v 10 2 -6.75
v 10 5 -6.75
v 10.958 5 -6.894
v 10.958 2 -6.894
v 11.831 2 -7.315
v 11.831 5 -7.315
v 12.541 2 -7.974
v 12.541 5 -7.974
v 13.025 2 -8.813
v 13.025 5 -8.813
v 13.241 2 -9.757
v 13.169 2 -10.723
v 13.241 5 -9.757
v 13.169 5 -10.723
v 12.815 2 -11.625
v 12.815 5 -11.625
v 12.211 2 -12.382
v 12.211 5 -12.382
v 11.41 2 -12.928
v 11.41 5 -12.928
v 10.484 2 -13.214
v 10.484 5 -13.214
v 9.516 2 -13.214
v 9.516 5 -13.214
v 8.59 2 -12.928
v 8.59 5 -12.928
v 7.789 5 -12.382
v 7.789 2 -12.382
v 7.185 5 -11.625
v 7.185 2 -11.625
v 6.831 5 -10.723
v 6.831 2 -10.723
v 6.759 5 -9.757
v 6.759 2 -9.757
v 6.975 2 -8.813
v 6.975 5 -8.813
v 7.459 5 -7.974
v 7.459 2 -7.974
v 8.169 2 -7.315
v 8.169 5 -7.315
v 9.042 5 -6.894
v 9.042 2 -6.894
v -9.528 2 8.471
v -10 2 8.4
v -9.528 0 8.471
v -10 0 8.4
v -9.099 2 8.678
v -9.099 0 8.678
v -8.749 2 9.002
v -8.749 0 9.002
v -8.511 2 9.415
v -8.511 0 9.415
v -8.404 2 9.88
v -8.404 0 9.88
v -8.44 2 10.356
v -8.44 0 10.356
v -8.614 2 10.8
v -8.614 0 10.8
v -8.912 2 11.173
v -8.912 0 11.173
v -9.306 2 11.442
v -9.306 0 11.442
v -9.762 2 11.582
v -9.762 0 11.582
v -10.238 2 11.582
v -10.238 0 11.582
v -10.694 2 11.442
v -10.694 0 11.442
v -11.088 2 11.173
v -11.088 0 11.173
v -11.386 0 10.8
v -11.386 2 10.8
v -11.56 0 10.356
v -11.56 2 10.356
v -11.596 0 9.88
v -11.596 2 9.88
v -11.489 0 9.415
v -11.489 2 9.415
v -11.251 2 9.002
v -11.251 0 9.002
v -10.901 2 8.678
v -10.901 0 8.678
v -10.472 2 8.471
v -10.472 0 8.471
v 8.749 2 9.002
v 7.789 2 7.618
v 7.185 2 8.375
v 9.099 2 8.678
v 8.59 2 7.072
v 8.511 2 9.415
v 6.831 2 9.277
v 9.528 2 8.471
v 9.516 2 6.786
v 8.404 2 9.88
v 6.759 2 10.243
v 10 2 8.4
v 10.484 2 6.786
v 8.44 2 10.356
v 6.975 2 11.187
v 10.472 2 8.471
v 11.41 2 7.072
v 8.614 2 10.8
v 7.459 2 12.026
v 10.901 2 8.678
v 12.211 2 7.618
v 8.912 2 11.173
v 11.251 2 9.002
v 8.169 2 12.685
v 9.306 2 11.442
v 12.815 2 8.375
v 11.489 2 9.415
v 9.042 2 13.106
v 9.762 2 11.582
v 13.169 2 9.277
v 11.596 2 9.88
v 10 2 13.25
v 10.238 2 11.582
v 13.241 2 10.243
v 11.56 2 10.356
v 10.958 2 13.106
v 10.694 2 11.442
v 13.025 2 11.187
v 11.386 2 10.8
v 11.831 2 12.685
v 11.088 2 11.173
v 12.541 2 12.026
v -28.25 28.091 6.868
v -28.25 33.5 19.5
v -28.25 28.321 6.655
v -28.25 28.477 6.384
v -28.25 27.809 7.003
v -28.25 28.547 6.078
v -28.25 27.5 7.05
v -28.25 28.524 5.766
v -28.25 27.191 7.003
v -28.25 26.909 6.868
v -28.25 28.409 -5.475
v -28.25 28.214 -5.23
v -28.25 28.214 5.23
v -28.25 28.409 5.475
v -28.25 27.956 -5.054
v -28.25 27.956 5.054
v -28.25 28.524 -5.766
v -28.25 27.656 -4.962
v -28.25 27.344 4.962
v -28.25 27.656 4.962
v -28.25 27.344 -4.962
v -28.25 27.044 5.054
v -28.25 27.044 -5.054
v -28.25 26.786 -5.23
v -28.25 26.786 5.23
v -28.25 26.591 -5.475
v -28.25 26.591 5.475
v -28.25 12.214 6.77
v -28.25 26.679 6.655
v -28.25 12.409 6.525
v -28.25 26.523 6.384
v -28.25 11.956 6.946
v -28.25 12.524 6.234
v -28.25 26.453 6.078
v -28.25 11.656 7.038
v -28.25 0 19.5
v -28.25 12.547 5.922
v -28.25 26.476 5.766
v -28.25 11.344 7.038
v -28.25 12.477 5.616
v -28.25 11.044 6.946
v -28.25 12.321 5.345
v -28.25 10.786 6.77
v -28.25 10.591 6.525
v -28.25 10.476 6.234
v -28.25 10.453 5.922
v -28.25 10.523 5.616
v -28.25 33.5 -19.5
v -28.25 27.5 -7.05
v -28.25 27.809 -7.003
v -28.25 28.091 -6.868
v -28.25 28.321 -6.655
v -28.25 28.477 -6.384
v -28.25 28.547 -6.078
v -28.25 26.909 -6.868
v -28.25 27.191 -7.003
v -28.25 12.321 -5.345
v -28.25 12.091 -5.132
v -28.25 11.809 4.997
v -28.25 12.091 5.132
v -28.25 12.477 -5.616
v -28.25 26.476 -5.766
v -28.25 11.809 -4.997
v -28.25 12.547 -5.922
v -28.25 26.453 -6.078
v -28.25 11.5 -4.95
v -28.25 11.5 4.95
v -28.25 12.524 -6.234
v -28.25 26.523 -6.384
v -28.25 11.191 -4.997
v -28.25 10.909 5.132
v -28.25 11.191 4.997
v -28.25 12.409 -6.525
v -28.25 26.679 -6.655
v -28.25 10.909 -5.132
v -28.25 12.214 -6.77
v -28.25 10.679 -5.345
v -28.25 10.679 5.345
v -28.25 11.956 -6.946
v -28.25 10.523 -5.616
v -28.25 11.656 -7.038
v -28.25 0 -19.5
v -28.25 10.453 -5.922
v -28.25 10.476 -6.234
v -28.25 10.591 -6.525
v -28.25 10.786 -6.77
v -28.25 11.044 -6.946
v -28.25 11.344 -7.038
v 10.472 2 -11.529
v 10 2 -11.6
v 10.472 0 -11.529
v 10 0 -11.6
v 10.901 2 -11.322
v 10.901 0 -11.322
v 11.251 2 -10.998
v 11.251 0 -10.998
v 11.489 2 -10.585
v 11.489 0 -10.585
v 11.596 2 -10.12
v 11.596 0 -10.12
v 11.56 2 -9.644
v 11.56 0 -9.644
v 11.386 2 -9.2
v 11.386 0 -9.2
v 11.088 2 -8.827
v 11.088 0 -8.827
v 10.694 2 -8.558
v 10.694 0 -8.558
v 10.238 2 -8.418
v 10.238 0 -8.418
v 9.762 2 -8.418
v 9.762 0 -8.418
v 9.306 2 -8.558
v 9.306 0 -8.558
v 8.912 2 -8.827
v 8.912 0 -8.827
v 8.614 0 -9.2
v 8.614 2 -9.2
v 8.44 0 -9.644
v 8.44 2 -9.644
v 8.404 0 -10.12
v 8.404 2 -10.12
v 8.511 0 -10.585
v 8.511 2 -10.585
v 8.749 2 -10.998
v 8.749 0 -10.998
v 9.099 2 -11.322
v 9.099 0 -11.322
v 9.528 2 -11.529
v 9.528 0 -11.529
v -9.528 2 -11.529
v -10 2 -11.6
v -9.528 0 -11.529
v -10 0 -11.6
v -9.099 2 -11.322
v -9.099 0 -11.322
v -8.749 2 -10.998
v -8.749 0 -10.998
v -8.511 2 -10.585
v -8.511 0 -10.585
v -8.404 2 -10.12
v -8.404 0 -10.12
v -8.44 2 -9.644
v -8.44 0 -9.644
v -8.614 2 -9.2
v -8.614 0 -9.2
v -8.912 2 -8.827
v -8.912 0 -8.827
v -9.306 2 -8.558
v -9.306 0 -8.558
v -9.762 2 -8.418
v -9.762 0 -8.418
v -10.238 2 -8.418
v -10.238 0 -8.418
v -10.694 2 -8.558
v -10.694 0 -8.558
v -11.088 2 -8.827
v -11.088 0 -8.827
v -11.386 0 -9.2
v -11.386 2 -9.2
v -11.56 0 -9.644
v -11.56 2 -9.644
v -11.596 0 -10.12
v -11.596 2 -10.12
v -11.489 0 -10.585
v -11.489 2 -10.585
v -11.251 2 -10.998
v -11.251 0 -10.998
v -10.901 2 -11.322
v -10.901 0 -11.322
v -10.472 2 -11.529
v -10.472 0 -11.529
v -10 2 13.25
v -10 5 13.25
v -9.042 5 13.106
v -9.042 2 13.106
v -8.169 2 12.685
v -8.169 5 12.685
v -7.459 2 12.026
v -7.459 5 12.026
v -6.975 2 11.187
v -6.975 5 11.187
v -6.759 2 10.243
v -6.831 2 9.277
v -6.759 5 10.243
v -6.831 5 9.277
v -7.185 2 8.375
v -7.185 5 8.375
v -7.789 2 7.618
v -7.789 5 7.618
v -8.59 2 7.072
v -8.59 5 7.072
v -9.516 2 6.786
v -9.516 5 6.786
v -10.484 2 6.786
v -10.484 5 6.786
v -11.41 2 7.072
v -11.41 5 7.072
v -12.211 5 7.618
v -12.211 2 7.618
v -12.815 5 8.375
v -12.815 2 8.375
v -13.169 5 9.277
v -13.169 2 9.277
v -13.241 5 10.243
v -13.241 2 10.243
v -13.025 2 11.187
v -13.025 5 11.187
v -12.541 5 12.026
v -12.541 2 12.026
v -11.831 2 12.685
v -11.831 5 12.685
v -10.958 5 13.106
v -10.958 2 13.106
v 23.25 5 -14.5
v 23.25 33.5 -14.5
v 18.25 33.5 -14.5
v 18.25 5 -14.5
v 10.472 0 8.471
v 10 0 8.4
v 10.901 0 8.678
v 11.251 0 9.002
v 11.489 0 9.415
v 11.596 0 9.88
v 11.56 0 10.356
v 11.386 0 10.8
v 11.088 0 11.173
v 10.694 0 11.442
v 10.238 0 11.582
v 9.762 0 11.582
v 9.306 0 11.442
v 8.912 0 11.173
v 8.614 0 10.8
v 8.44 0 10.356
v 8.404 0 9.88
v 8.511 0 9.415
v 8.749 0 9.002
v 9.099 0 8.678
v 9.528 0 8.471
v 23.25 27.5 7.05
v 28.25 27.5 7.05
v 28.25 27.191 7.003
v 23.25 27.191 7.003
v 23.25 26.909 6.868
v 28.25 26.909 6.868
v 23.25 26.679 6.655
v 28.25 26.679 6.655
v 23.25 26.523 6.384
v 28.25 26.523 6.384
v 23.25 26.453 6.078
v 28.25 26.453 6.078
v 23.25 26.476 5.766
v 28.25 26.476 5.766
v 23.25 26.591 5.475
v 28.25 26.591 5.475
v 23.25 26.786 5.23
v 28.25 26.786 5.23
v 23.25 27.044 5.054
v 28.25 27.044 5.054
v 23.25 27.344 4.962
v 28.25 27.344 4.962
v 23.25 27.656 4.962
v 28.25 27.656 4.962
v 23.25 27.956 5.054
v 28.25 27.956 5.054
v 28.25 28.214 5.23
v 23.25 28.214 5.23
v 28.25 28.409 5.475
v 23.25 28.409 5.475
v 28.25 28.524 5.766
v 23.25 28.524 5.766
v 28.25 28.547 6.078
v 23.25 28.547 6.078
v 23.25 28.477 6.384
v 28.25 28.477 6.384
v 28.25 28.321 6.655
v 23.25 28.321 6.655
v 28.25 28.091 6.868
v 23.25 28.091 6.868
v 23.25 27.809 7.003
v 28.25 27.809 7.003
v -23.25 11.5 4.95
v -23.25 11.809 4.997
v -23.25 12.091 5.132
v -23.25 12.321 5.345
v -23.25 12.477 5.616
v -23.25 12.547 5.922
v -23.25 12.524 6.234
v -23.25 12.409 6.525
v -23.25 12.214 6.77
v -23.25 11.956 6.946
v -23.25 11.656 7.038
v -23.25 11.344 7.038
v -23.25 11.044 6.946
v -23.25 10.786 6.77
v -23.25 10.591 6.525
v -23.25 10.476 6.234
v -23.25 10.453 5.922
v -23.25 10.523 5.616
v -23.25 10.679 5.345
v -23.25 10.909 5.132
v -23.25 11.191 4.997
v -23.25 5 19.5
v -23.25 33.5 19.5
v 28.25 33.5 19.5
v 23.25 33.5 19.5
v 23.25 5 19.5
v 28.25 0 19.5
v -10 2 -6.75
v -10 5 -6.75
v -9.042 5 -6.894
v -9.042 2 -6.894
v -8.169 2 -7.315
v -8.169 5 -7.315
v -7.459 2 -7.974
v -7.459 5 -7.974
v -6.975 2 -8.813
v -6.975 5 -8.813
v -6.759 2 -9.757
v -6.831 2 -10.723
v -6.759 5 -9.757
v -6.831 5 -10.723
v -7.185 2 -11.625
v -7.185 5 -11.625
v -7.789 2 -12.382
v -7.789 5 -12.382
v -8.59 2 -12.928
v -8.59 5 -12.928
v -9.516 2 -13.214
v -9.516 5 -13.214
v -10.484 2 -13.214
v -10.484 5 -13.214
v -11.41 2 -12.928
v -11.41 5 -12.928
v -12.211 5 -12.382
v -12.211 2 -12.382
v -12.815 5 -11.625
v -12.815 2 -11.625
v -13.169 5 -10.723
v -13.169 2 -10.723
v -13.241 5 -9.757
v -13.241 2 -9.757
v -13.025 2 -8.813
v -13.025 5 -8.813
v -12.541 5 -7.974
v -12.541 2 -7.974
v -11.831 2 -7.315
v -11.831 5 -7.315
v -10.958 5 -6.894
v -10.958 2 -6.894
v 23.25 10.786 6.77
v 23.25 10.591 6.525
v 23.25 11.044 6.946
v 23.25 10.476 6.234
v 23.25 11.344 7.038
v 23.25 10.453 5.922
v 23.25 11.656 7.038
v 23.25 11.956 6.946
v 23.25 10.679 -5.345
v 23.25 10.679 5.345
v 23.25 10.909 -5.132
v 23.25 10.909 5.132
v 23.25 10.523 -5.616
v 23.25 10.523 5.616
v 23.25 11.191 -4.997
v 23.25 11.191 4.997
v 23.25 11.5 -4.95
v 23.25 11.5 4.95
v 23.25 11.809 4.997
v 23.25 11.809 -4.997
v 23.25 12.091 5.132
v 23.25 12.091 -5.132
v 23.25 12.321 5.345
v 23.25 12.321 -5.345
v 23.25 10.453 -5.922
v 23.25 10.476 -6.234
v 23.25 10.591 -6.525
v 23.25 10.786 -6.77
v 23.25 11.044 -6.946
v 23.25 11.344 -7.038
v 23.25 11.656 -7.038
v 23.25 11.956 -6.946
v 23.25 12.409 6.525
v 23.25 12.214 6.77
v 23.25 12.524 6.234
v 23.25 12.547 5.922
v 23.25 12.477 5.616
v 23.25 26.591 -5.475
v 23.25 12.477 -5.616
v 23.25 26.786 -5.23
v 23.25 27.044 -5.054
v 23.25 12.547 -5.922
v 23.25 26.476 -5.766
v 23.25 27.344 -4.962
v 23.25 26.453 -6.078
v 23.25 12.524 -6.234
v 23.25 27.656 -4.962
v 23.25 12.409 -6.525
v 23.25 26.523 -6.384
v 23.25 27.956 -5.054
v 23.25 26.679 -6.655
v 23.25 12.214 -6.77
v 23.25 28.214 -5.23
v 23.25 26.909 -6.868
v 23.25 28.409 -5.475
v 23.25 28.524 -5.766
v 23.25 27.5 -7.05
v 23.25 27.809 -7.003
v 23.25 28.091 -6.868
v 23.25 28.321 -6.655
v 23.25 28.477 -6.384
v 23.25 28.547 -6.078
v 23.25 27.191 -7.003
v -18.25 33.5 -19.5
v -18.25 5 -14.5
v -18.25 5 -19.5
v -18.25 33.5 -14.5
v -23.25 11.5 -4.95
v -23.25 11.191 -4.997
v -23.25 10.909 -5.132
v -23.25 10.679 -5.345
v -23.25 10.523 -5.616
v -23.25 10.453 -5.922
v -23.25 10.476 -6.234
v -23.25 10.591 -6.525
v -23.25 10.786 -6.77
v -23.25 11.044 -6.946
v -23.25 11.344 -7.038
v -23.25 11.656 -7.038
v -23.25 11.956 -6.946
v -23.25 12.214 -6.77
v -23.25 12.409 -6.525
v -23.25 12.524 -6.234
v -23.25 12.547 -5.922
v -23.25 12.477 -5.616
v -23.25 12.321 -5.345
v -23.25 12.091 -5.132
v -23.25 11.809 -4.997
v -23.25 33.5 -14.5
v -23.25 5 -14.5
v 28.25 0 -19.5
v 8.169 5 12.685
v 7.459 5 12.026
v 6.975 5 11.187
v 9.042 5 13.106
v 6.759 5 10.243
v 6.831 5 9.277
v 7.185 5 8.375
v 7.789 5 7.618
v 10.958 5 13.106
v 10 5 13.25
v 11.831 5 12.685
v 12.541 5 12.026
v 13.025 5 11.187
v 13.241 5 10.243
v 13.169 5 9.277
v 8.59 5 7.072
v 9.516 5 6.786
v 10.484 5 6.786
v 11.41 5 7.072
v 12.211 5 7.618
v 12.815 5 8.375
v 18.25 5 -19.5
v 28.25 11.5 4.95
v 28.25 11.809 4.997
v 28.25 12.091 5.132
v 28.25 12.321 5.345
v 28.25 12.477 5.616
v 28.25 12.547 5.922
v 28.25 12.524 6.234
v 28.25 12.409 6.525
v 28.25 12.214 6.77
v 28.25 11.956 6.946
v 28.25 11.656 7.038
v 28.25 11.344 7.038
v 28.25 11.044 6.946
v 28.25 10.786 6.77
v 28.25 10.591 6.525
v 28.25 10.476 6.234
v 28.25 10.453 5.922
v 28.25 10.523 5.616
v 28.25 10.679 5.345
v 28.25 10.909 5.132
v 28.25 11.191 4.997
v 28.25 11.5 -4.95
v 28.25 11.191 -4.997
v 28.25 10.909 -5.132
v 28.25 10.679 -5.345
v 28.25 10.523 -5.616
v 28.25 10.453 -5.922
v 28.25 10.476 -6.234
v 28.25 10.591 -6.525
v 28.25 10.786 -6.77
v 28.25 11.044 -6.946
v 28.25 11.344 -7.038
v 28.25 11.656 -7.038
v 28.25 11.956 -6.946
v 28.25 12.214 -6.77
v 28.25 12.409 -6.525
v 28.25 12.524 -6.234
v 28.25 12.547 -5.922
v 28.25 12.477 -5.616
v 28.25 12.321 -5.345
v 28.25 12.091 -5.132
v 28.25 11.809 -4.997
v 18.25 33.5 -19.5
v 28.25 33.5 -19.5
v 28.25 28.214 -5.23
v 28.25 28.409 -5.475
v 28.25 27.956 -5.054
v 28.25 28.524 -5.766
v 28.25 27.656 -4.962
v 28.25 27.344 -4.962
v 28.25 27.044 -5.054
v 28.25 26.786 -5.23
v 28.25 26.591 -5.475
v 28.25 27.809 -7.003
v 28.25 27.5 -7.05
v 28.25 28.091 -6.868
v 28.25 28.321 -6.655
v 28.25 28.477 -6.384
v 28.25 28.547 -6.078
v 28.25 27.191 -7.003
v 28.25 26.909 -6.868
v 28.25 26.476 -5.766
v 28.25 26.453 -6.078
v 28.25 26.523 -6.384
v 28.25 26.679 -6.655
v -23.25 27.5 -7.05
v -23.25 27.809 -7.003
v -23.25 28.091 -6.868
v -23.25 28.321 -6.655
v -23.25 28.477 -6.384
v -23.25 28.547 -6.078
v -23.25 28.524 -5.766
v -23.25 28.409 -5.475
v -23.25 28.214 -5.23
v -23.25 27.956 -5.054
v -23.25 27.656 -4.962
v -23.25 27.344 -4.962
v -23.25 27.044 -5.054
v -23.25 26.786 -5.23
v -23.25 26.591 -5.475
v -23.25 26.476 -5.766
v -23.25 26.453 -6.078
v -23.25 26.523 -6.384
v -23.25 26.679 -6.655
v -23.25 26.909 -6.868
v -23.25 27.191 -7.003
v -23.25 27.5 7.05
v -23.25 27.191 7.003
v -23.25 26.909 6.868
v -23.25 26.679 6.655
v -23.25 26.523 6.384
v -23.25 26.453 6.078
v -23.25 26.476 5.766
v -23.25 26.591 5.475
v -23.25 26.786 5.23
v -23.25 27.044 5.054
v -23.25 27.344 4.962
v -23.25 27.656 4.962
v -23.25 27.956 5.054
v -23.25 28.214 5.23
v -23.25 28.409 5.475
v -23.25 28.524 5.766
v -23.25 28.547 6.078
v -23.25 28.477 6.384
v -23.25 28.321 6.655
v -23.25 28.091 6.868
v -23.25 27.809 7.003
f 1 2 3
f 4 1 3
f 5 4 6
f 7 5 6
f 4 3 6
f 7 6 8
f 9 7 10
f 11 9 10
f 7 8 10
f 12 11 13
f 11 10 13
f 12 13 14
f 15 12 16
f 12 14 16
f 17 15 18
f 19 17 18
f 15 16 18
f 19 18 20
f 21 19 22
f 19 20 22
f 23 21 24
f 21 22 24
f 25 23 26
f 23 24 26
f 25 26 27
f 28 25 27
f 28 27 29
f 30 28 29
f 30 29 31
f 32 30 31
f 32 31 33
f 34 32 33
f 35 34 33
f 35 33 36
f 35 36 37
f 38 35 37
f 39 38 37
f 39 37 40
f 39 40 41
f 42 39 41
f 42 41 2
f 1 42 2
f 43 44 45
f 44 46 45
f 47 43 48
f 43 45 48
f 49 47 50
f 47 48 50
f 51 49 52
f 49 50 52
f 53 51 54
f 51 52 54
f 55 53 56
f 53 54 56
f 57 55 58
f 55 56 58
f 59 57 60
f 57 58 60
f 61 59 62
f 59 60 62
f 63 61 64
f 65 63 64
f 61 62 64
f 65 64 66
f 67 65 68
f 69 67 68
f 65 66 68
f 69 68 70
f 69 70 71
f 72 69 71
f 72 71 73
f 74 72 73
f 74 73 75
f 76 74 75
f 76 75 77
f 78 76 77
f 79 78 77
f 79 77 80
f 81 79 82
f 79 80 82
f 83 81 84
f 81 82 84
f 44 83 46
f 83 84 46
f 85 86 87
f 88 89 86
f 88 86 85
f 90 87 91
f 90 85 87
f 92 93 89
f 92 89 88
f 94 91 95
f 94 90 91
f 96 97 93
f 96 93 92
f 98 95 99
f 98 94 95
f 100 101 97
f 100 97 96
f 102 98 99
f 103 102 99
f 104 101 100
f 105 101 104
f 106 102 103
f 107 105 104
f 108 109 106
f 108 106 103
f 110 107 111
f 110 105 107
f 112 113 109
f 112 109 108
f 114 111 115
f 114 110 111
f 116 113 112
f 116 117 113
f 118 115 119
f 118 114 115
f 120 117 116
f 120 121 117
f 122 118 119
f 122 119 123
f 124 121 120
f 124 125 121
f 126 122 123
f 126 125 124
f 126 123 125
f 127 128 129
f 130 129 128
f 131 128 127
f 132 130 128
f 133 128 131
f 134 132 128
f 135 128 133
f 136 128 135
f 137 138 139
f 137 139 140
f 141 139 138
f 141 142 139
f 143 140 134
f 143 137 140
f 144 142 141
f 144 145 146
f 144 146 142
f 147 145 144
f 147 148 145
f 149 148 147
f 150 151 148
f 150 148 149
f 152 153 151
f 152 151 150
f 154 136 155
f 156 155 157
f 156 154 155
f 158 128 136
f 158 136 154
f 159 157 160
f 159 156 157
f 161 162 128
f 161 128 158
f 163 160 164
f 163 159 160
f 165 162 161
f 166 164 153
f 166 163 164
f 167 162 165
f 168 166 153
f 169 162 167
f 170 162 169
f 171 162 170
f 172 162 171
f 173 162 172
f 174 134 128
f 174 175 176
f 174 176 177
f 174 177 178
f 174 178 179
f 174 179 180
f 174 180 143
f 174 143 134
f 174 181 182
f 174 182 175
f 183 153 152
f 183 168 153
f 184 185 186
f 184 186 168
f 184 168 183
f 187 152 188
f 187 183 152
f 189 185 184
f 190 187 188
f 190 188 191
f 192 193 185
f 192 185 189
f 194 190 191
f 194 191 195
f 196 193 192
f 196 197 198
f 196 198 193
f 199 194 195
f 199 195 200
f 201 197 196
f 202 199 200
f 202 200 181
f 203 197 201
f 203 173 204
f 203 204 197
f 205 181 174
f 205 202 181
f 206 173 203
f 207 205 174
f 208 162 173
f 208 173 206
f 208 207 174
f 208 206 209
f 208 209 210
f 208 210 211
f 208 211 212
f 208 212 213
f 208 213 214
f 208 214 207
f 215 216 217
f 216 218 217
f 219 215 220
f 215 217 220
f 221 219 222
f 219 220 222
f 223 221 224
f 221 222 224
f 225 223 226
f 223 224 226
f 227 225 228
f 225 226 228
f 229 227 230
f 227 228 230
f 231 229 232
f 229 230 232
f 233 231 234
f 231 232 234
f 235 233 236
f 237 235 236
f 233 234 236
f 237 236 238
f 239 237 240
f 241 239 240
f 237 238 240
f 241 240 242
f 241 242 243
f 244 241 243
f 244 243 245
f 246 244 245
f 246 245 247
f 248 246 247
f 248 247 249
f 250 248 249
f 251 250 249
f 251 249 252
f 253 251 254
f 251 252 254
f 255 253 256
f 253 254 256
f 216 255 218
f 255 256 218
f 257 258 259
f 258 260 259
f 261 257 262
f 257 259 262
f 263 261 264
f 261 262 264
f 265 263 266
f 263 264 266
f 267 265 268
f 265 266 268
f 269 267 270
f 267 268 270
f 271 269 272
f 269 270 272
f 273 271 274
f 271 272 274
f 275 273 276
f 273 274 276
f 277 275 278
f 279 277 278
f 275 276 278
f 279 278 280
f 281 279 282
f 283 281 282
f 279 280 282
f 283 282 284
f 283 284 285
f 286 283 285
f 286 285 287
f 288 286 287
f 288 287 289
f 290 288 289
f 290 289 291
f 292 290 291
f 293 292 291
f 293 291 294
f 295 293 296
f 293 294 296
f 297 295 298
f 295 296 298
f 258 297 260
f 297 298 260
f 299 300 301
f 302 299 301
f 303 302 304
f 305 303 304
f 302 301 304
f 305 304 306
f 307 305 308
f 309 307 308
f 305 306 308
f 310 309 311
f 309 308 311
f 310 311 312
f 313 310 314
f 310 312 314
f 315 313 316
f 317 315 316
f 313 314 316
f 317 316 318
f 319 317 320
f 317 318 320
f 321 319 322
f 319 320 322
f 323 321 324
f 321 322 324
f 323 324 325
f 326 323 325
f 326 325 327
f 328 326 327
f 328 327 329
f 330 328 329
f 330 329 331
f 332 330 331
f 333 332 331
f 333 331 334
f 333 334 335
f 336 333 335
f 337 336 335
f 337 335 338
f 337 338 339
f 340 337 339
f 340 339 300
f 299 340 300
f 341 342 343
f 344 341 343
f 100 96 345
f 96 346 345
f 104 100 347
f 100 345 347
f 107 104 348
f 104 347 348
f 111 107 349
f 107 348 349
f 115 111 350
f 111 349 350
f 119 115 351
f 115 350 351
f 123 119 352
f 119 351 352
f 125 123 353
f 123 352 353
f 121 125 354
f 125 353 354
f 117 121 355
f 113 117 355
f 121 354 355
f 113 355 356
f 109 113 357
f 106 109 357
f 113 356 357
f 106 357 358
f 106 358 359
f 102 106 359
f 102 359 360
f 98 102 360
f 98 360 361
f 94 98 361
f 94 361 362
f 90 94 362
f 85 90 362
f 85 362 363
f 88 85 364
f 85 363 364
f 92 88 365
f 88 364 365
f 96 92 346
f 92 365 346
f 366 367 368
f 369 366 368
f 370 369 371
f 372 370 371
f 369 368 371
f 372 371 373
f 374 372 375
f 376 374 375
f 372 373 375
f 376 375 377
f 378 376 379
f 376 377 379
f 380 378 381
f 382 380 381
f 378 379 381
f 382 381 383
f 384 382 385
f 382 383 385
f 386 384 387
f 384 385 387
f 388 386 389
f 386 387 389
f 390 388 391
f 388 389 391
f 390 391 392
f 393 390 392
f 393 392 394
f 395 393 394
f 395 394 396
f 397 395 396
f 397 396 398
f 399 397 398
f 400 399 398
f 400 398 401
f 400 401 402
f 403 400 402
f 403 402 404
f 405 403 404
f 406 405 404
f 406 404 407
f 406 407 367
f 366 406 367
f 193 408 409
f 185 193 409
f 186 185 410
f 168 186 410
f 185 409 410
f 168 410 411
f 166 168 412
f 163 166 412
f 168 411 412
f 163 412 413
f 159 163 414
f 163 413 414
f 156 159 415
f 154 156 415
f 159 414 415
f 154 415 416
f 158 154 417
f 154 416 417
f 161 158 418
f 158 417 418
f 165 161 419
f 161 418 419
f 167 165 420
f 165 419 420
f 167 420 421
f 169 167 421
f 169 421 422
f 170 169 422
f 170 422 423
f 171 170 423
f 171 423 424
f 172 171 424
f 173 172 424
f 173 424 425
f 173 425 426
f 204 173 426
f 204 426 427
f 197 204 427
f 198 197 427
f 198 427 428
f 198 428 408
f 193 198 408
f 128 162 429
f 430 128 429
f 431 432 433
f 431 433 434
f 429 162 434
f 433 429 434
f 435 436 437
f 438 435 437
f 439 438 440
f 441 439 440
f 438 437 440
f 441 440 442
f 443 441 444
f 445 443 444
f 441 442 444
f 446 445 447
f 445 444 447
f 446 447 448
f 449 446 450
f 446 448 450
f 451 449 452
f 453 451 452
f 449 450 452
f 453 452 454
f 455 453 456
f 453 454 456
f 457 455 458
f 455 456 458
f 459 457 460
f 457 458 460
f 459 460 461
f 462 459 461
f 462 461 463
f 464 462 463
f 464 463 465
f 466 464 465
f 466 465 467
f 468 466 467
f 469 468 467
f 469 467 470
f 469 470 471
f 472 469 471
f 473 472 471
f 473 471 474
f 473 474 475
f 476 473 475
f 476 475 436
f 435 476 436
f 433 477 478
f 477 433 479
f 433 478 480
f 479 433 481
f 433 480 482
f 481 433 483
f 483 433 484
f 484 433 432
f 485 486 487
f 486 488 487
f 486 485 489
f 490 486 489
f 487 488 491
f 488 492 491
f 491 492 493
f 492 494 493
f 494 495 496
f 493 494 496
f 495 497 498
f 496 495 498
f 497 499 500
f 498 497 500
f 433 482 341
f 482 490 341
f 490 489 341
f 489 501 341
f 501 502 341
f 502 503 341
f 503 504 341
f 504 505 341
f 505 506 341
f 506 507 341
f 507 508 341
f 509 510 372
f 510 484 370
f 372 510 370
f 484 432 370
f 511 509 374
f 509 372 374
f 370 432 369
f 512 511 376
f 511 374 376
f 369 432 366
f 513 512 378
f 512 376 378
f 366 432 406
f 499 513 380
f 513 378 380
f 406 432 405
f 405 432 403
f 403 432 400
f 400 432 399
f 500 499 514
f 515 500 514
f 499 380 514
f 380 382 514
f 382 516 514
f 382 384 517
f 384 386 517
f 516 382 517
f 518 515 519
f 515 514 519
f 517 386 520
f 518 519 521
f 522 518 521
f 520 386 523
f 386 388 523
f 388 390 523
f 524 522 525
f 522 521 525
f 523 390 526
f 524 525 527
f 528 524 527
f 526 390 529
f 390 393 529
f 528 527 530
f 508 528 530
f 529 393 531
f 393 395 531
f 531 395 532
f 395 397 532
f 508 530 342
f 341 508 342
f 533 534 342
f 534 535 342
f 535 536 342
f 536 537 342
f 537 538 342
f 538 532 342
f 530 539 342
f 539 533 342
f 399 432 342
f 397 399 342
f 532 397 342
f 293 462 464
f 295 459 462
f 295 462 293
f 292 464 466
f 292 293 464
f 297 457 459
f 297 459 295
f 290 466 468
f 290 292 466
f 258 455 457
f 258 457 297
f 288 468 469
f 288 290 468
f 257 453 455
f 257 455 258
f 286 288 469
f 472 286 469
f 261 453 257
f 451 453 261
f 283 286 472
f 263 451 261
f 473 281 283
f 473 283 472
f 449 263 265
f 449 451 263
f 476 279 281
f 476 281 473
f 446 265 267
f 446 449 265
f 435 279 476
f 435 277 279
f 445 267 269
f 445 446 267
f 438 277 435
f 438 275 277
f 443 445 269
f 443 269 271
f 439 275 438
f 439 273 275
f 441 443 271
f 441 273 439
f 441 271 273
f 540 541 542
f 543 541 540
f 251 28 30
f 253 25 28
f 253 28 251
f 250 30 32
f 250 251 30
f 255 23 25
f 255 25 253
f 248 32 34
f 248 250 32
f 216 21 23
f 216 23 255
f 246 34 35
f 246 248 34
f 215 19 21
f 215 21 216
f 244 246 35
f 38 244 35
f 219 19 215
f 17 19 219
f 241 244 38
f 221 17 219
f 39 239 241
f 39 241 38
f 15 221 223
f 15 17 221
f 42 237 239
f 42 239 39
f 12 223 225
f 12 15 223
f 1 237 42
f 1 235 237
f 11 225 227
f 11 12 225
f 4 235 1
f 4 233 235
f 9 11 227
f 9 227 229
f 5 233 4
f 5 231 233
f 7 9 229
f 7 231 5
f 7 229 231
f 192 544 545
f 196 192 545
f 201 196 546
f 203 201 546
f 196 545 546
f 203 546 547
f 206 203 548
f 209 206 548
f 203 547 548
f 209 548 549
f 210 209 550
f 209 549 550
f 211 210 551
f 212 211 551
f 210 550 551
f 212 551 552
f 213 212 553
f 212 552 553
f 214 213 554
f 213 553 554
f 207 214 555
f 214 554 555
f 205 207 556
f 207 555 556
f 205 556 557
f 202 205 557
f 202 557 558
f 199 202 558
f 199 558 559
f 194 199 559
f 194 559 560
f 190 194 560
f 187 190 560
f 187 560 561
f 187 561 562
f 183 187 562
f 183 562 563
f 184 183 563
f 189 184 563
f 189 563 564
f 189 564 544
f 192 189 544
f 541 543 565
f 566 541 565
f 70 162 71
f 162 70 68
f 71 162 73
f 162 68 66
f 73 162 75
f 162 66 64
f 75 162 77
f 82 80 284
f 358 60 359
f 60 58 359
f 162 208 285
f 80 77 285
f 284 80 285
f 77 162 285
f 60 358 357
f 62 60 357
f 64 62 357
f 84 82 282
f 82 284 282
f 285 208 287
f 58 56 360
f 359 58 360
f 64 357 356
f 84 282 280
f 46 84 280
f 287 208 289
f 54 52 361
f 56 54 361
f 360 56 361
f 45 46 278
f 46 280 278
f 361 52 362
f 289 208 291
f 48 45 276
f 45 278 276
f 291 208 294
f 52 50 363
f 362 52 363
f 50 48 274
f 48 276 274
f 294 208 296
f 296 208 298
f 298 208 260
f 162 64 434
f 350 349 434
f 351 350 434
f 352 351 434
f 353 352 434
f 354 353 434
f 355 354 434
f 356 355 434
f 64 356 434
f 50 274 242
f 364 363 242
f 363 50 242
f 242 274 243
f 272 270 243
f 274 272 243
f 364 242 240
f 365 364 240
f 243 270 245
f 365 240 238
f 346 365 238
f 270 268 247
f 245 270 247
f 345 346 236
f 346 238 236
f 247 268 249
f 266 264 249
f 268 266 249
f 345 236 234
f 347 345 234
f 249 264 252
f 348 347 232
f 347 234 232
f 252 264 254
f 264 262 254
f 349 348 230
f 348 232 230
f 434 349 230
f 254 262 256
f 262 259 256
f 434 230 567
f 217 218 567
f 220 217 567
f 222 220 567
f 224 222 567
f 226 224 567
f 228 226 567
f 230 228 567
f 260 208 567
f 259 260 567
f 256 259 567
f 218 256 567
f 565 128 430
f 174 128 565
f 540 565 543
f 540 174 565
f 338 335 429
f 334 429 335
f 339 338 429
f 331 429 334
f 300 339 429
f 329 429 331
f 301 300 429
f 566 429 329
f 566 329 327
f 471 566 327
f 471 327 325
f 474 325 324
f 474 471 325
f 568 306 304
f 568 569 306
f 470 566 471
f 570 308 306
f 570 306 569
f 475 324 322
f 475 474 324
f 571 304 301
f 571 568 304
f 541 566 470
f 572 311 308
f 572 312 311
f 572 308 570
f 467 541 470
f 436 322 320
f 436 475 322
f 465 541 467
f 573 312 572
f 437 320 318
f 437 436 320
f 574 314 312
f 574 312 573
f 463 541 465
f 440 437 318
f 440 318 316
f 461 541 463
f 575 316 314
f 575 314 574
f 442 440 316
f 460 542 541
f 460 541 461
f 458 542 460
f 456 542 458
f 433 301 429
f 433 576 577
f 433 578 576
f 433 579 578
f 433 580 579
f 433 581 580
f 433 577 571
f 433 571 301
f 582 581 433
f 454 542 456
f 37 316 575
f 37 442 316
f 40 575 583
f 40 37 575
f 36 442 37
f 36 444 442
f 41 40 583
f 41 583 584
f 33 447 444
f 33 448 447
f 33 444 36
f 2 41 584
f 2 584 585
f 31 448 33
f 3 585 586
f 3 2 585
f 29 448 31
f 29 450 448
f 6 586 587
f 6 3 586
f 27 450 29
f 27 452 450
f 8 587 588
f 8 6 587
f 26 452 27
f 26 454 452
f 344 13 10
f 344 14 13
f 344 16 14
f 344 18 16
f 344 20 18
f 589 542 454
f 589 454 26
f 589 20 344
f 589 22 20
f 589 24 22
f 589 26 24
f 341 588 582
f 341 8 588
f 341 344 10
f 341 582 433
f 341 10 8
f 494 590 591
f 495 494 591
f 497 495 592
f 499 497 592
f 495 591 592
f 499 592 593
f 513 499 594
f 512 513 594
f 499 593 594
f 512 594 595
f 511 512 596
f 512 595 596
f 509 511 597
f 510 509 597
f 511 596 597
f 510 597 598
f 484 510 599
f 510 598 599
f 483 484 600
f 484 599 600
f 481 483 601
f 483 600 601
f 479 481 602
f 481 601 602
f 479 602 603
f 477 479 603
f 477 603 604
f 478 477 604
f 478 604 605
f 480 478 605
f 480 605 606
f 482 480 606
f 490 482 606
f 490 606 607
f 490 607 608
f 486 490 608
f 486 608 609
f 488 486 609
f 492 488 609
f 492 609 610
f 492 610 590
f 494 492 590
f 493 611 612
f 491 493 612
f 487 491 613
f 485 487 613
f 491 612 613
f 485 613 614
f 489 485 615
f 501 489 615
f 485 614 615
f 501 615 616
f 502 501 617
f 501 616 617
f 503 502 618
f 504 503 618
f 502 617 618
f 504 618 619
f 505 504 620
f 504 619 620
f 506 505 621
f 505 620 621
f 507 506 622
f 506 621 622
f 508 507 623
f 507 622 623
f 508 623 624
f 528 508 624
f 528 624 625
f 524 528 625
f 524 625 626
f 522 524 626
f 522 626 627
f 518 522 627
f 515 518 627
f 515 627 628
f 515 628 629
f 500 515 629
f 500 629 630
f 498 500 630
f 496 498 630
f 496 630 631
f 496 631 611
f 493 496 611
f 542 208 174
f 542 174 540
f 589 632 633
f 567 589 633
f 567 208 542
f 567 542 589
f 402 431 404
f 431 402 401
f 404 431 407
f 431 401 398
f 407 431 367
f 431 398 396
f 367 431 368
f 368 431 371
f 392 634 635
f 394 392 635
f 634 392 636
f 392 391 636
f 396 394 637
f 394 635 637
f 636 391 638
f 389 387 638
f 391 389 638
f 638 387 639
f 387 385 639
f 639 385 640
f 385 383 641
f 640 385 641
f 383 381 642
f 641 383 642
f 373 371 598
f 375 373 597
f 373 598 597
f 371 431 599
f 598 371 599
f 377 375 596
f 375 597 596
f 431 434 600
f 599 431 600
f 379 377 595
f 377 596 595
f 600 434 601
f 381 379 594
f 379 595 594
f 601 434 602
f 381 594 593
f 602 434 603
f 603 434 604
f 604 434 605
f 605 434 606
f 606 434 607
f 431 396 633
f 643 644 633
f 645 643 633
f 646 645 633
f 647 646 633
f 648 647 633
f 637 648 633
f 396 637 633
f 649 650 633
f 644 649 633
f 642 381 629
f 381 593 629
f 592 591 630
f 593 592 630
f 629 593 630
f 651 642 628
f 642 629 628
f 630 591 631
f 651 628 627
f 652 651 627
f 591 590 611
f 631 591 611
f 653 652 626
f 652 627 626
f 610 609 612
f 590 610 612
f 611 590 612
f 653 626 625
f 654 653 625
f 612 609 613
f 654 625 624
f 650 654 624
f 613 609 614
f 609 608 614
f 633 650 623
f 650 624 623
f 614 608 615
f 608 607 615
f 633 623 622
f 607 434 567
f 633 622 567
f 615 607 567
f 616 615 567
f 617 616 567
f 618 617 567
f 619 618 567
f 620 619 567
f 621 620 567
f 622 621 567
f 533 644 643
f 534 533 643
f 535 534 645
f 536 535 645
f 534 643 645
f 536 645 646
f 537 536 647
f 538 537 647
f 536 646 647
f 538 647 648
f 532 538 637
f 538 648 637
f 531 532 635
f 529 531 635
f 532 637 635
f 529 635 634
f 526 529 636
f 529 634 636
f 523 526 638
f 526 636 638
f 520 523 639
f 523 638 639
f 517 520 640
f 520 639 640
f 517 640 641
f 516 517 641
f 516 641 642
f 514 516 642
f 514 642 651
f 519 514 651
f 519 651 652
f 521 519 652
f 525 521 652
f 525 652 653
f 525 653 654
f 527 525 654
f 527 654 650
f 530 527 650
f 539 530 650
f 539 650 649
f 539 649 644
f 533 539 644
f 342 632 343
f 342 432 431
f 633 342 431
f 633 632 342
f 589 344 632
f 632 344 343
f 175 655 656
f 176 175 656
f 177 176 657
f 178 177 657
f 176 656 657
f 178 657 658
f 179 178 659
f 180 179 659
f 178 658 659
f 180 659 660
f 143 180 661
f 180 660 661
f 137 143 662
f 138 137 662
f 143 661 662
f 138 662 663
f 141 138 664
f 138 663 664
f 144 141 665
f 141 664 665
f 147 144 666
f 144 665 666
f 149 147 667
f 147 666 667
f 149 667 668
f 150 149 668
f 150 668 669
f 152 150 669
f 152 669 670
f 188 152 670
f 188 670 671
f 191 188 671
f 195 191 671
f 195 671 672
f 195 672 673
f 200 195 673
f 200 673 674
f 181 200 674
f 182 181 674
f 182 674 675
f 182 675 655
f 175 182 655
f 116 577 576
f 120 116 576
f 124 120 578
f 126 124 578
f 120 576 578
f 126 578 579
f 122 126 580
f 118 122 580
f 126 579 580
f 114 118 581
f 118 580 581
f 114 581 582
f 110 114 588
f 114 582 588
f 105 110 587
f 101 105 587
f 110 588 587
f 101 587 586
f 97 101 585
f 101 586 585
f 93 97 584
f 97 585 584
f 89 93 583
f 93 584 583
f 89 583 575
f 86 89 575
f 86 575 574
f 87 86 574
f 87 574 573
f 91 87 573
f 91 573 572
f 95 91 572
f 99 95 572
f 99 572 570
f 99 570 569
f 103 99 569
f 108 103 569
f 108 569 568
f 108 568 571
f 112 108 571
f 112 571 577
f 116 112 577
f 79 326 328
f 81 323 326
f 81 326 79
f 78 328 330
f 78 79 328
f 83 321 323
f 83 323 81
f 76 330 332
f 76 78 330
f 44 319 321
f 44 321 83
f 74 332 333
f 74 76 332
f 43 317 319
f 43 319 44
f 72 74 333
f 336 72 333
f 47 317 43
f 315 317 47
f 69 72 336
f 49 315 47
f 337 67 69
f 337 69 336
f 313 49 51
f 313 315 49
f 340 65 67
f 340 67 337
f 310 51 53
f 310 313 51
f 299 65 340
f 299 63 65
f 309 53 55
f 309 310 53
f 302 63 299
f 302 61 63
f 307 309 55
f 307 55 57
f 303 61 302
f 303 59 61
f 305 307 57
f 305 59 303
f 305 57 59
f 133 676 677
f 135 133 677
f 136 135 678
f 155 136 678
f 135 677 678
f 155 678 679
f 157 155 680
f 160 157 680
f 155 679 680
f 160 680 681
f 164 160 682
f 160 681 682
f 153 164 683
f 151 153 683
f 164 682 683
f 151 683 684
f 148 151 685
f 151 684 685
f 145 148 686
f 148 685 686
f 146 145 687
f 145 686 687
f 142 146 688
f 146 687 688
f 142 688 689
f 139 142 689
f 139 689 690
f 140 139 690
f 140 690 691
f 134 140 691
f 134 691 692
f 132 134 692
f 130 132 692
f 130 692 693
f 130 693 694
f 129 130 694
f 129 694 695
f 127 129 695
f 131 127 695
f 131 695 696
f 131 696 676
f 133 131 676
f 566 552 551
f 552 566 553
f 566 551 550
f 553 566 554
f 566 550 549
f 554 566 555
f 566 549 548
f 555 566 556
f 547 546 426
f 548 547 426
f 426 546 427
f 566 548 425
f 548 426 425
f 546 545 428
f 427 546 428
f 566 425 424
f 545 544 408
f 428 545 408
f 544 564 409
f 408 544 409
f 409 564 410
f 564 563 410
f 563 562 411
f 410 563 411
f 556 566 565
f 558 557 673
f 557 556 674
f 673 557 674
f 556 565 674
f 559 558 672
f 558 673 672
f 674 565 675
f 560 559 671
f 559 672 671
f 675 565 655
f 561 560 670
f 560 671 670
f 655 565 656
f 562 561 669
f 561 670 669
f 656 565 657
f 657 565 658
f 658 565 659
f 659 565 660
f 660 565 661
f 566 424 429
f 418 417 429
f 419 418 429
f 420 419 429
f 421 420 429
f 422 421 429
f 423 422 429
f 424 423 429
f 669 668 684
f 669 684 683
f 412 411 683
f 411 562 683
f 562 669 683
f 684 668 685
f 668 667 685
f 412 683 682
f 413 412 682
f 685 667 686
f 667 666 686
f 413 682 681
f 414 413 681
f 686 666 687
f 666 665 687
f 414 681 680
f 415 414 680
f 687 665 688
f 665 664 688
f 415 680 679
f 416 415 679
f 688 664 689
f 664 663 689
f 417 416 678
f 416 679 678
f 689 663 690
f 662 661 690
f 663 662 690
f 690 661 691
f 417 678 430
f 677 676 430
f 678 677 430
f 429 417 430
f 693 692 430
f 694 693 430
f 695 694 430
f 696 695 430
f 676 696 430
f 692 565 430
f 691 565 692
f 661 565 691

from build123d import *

# Parameters (mm, degrees)
SKETCH9_W                                       = 56.5
SKETCH9_H                                       = 39
BOSS_EXTRUDE7_DEPTH                             = 33.5
SKETCH10_R                                      = 1.05
CUT_EXTRUDE2_DEPTH                              = 69.518245745
CUT_EXTRUDE3_DEPTH                              = 28.5
SKETCH12_W                                      = 36.5
SKETCH12_H                                      = 28.5
CUT_EXTRUDE4_DEPTH                              = 56.464515683
CBORE_FOR_M3_SOCKET_HEAD_CAP_SCREW3_D           = 3.2
CBORE_FOR_M3_SOCKET_HEAD_CAP_SCREW3_CBORE_D     = 6.5
CBORE_FOR_M3_SOCKET_HEAD_CAP_SCREW3_CBORE_DEPTH = 3


with BuildPart() as part:
    # Sketch9 → Boss-Extrude7 (new body)
    with BuildSketch(Plane(origin=(0, 0, 0), x_dir=(1, 0, 0), z_dir=(0, 1, 0))):
        Rectangle(SKETCH9_W, SKETCH9_H)
    extrude(amount=BOSS_EXTRUDE7_DEPTH)

    # Sketch10 → Cut-Extrude2 (cut, through all)
    with BuildSketch(Plane(origin=(28.25, 0, 0), x_dir=(0, 0, -1), z_dir=(1, 0, 0))):
        with Locations((-6, 11.5)):
            Circle(SKETCH10_R)
        with Locations(Location((6, 11.5, 0), (0, 0, 180))):
            Circle(SKETCH10_R)
        with Locations((6, 27.5)):
            Circle(SKETCH10_R)
        with Locations(Location((-6, 27.5, 0), (0, 0, 180))):
            Circle(SKETCH10_R)
    extrude(amount=-CUT_EXTRUDE2_DEPTH, mode=Mode.SUBTRACT)

    # Sketch11 → Cut-Extrude3 (cut)
    with BuildSketch(Plane(origin=(0, 33.5, 0), x_dir=(1, 0, 0), z_dir=(0, 1, 0))):
        Polygon((-23.25, -14.5), (-23.25, -19.5), (23.25, -19.5), (23.25, -14.5), (23.25, 14.5), (-23.25, 14.5), align=None)
    extrude(amount=-CUT_EXTRUDE3_DEPTH, mode=Mode.SUBTRACT)

    # Sketch12 → Cut-Extrude4 (cut, through all)
    with BuildSketch(Plane.XY.offset(-14.5)):
        with Locations((0, 19.25)):
            Rectangle(SKETCH12_W, SKETCH12_H)
    extrude(amount=-CUT_EXTRUDE4_DEPTH, mode=Mode.SUBTRACT)

    # CBORE for M3 Socket Head Cap Screw3 (through all)
    with Locations(Plane(origin=(10, 5, -10), x_dir=(0, 0, 1), z_dir=(0, 1, 0))):
        with Locations((0, 0), (20, 0), (20, -20), (0, -20)):
            CounterBoreHole(CBORE_FOR_M3_SOCKET_HEAD_CAP_SCREW3_D / 2, CBORE_FOR_M3_SOCKET_HEAD_CAP_SCREW3_CBORE_D / 2, CBORE_FOR_M3_SOCKET_HEAD_CAP_SCREW3_CBORE_DEPTH)


solid = part.part
